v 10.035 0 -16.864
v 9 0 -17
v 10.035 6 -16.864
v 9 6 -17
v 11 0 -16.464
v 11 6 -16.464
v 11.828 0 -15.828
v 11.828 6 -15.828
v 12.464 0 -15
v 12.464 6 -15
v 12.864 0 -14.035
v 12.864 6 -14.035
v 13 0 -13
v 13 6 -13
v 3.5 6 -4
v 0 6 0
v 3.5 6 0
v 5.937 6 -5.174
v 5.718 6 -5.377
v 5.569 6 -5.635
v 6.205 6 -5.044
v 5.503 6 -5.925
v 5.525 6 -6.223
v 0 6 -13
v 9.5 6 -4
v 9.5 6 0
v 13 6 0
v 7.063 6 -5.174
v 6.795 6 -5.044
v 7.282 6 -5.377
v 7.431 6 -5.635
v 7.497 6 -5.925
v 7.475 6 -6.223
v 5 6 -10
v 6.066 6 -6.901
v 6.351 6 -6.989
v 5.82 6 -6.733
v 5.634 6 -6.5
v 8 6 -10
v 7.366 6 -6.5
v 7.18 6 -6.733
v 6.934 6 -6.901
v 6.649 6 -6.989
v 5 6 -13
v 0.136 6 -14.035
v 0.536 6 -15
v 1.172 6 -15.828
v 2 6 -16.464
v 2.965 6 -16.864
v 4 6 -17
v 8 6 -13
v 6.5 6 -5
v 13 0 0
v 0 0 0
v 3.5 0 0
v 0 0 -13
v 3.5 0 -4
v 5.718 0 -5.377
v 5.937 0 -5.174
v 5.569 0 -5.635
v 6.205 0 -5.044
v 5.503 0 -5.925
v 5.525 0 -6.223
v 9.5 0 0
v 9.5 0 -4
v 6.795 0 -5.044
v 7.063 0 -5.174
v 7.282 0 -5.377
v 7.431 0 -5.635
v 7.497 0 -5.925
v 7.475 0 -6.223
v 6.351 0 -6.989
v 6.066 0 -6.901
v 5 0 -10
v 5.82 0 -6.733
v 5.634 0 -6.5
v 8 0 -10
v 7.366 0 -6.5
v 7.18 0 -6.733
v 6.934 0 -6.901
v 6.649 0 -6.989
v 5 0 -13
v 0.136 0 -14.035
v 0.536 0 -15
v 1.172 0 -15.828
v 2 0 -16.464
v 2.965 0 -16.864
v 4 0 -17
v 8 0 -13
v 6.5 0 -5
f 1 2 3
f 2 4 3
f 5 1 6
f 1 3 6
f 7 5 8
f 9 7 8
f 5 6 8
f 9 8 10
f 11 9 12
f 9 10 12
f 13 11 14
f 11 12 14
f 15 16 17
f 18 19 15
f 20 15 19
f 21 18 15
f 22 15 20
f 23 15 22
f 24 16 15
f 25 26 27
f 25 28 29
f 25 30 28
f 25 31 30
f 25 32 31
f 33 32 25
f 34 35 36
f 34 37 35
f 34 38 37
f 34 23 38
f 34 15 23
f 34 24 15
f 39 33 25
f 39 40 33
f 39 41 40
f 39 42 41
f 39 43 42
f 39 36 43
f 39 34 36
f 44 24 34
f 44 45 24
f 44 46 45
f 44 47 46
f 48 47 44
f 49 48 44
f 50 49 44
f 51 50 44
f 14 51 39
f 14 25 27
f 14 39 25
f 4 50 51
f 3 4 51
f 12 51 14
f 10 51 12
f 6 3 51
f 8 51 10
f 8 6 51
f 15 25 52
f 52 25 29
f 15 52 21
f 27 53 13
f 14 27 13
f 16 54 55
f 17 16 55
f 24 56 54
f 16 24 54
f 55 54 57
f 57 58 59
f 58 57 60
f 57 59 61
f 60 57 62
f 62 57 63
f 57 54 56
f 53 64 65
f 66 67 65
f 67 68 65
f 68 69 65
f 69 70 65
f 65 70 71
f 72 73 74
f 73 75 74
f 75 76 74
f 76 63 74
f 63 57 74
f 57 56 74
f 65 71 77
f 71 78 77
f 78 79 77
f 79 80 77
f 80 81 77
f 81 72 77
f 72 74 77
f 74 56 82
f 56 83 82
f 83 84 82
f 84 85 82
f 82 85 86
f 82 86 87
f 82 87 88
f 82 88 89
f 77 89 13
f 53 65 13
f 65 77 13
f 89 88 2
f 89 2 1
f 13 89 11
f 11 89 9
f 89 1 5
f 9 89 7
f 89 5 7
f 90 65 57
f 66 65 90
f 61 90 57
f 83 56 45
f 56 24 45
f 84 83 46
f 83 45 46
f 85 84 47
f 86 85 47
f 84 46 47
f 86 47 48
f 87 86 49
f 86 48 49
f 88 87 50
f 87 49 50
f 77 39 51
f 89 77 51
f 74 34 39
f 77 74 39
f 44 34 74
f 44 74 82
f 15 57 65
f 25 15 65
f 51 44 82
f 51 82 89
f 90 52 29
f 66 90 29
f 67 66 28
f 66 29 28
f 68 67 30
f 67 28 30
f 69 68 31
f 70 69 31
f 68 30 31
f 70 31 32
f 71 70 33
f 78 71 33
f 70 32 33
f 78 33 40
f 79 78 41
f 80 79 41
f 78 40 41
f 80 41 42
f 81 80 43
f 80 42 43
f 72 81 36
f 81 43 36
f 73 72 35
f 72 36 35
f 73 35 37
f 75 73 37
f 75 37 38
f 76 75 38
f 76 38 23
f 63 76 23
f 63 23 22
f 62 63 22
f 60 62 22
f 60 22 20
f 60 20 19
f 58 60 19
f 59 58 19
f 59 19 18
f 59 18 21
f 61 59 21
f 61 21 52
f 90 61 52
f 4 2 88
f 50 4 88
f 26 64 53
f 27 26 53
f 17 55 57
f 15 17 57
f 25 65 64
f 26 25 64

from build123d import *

# Parameters (mm, degrees)
BOSS_EXTRUDE1_DEPTH = 6
SKETCH2_R           = 1
SKETCH2_W           = 3
SKETCH2_H           = 3
CUT_EXTRUDE1_DEPTH  = 23.226110771
FILLET1_R           = 4


with BuildPart() as part:
    # Sketch1 → Boss-Extrude1 (new body)
    with BuildSketch(Plane(origin=(0, 0, 0), x_dir=(1, 0, 0), z_dir=(0, 1, 0))):
        Polygon((3.5, 0), (3.5, 4), (9.5, 4), (9.5, 0), (13, 0), (13, 17), (0, 17), (0, 0), align=None)
    extrude(amount=BOSS_EXTRUDE1_DEPTH)

    # Sketch2 → Cut-Extrude1 (cut, through all)
    with BuildSketch(Plane(origin=(0, 6, 0), x_dir=(1, 0, 0), z_dir=(0, 1, 0))):
        with Locations(Location((6.5, 6, 0), (0, 0, 270))):
            Circle(SKETCH2_R)
        with Locations((6.5, 11.5)):
            Rectangle(SKETCH2_W, SKETCH2_H)
    extrude(amount=-CUT_EXTRUDE1_DEPTH, mode=Mode.SUBTRACT)

    # Fillet1
    fillet1_edges = [part.edges().sort_by_distance(p)[0] for p in [
        (0, 3, -17),
        (13, 3, -17),
    ]]
    fillet(fillet1_edges, radius=FILLET1_R)


solid = part.part
